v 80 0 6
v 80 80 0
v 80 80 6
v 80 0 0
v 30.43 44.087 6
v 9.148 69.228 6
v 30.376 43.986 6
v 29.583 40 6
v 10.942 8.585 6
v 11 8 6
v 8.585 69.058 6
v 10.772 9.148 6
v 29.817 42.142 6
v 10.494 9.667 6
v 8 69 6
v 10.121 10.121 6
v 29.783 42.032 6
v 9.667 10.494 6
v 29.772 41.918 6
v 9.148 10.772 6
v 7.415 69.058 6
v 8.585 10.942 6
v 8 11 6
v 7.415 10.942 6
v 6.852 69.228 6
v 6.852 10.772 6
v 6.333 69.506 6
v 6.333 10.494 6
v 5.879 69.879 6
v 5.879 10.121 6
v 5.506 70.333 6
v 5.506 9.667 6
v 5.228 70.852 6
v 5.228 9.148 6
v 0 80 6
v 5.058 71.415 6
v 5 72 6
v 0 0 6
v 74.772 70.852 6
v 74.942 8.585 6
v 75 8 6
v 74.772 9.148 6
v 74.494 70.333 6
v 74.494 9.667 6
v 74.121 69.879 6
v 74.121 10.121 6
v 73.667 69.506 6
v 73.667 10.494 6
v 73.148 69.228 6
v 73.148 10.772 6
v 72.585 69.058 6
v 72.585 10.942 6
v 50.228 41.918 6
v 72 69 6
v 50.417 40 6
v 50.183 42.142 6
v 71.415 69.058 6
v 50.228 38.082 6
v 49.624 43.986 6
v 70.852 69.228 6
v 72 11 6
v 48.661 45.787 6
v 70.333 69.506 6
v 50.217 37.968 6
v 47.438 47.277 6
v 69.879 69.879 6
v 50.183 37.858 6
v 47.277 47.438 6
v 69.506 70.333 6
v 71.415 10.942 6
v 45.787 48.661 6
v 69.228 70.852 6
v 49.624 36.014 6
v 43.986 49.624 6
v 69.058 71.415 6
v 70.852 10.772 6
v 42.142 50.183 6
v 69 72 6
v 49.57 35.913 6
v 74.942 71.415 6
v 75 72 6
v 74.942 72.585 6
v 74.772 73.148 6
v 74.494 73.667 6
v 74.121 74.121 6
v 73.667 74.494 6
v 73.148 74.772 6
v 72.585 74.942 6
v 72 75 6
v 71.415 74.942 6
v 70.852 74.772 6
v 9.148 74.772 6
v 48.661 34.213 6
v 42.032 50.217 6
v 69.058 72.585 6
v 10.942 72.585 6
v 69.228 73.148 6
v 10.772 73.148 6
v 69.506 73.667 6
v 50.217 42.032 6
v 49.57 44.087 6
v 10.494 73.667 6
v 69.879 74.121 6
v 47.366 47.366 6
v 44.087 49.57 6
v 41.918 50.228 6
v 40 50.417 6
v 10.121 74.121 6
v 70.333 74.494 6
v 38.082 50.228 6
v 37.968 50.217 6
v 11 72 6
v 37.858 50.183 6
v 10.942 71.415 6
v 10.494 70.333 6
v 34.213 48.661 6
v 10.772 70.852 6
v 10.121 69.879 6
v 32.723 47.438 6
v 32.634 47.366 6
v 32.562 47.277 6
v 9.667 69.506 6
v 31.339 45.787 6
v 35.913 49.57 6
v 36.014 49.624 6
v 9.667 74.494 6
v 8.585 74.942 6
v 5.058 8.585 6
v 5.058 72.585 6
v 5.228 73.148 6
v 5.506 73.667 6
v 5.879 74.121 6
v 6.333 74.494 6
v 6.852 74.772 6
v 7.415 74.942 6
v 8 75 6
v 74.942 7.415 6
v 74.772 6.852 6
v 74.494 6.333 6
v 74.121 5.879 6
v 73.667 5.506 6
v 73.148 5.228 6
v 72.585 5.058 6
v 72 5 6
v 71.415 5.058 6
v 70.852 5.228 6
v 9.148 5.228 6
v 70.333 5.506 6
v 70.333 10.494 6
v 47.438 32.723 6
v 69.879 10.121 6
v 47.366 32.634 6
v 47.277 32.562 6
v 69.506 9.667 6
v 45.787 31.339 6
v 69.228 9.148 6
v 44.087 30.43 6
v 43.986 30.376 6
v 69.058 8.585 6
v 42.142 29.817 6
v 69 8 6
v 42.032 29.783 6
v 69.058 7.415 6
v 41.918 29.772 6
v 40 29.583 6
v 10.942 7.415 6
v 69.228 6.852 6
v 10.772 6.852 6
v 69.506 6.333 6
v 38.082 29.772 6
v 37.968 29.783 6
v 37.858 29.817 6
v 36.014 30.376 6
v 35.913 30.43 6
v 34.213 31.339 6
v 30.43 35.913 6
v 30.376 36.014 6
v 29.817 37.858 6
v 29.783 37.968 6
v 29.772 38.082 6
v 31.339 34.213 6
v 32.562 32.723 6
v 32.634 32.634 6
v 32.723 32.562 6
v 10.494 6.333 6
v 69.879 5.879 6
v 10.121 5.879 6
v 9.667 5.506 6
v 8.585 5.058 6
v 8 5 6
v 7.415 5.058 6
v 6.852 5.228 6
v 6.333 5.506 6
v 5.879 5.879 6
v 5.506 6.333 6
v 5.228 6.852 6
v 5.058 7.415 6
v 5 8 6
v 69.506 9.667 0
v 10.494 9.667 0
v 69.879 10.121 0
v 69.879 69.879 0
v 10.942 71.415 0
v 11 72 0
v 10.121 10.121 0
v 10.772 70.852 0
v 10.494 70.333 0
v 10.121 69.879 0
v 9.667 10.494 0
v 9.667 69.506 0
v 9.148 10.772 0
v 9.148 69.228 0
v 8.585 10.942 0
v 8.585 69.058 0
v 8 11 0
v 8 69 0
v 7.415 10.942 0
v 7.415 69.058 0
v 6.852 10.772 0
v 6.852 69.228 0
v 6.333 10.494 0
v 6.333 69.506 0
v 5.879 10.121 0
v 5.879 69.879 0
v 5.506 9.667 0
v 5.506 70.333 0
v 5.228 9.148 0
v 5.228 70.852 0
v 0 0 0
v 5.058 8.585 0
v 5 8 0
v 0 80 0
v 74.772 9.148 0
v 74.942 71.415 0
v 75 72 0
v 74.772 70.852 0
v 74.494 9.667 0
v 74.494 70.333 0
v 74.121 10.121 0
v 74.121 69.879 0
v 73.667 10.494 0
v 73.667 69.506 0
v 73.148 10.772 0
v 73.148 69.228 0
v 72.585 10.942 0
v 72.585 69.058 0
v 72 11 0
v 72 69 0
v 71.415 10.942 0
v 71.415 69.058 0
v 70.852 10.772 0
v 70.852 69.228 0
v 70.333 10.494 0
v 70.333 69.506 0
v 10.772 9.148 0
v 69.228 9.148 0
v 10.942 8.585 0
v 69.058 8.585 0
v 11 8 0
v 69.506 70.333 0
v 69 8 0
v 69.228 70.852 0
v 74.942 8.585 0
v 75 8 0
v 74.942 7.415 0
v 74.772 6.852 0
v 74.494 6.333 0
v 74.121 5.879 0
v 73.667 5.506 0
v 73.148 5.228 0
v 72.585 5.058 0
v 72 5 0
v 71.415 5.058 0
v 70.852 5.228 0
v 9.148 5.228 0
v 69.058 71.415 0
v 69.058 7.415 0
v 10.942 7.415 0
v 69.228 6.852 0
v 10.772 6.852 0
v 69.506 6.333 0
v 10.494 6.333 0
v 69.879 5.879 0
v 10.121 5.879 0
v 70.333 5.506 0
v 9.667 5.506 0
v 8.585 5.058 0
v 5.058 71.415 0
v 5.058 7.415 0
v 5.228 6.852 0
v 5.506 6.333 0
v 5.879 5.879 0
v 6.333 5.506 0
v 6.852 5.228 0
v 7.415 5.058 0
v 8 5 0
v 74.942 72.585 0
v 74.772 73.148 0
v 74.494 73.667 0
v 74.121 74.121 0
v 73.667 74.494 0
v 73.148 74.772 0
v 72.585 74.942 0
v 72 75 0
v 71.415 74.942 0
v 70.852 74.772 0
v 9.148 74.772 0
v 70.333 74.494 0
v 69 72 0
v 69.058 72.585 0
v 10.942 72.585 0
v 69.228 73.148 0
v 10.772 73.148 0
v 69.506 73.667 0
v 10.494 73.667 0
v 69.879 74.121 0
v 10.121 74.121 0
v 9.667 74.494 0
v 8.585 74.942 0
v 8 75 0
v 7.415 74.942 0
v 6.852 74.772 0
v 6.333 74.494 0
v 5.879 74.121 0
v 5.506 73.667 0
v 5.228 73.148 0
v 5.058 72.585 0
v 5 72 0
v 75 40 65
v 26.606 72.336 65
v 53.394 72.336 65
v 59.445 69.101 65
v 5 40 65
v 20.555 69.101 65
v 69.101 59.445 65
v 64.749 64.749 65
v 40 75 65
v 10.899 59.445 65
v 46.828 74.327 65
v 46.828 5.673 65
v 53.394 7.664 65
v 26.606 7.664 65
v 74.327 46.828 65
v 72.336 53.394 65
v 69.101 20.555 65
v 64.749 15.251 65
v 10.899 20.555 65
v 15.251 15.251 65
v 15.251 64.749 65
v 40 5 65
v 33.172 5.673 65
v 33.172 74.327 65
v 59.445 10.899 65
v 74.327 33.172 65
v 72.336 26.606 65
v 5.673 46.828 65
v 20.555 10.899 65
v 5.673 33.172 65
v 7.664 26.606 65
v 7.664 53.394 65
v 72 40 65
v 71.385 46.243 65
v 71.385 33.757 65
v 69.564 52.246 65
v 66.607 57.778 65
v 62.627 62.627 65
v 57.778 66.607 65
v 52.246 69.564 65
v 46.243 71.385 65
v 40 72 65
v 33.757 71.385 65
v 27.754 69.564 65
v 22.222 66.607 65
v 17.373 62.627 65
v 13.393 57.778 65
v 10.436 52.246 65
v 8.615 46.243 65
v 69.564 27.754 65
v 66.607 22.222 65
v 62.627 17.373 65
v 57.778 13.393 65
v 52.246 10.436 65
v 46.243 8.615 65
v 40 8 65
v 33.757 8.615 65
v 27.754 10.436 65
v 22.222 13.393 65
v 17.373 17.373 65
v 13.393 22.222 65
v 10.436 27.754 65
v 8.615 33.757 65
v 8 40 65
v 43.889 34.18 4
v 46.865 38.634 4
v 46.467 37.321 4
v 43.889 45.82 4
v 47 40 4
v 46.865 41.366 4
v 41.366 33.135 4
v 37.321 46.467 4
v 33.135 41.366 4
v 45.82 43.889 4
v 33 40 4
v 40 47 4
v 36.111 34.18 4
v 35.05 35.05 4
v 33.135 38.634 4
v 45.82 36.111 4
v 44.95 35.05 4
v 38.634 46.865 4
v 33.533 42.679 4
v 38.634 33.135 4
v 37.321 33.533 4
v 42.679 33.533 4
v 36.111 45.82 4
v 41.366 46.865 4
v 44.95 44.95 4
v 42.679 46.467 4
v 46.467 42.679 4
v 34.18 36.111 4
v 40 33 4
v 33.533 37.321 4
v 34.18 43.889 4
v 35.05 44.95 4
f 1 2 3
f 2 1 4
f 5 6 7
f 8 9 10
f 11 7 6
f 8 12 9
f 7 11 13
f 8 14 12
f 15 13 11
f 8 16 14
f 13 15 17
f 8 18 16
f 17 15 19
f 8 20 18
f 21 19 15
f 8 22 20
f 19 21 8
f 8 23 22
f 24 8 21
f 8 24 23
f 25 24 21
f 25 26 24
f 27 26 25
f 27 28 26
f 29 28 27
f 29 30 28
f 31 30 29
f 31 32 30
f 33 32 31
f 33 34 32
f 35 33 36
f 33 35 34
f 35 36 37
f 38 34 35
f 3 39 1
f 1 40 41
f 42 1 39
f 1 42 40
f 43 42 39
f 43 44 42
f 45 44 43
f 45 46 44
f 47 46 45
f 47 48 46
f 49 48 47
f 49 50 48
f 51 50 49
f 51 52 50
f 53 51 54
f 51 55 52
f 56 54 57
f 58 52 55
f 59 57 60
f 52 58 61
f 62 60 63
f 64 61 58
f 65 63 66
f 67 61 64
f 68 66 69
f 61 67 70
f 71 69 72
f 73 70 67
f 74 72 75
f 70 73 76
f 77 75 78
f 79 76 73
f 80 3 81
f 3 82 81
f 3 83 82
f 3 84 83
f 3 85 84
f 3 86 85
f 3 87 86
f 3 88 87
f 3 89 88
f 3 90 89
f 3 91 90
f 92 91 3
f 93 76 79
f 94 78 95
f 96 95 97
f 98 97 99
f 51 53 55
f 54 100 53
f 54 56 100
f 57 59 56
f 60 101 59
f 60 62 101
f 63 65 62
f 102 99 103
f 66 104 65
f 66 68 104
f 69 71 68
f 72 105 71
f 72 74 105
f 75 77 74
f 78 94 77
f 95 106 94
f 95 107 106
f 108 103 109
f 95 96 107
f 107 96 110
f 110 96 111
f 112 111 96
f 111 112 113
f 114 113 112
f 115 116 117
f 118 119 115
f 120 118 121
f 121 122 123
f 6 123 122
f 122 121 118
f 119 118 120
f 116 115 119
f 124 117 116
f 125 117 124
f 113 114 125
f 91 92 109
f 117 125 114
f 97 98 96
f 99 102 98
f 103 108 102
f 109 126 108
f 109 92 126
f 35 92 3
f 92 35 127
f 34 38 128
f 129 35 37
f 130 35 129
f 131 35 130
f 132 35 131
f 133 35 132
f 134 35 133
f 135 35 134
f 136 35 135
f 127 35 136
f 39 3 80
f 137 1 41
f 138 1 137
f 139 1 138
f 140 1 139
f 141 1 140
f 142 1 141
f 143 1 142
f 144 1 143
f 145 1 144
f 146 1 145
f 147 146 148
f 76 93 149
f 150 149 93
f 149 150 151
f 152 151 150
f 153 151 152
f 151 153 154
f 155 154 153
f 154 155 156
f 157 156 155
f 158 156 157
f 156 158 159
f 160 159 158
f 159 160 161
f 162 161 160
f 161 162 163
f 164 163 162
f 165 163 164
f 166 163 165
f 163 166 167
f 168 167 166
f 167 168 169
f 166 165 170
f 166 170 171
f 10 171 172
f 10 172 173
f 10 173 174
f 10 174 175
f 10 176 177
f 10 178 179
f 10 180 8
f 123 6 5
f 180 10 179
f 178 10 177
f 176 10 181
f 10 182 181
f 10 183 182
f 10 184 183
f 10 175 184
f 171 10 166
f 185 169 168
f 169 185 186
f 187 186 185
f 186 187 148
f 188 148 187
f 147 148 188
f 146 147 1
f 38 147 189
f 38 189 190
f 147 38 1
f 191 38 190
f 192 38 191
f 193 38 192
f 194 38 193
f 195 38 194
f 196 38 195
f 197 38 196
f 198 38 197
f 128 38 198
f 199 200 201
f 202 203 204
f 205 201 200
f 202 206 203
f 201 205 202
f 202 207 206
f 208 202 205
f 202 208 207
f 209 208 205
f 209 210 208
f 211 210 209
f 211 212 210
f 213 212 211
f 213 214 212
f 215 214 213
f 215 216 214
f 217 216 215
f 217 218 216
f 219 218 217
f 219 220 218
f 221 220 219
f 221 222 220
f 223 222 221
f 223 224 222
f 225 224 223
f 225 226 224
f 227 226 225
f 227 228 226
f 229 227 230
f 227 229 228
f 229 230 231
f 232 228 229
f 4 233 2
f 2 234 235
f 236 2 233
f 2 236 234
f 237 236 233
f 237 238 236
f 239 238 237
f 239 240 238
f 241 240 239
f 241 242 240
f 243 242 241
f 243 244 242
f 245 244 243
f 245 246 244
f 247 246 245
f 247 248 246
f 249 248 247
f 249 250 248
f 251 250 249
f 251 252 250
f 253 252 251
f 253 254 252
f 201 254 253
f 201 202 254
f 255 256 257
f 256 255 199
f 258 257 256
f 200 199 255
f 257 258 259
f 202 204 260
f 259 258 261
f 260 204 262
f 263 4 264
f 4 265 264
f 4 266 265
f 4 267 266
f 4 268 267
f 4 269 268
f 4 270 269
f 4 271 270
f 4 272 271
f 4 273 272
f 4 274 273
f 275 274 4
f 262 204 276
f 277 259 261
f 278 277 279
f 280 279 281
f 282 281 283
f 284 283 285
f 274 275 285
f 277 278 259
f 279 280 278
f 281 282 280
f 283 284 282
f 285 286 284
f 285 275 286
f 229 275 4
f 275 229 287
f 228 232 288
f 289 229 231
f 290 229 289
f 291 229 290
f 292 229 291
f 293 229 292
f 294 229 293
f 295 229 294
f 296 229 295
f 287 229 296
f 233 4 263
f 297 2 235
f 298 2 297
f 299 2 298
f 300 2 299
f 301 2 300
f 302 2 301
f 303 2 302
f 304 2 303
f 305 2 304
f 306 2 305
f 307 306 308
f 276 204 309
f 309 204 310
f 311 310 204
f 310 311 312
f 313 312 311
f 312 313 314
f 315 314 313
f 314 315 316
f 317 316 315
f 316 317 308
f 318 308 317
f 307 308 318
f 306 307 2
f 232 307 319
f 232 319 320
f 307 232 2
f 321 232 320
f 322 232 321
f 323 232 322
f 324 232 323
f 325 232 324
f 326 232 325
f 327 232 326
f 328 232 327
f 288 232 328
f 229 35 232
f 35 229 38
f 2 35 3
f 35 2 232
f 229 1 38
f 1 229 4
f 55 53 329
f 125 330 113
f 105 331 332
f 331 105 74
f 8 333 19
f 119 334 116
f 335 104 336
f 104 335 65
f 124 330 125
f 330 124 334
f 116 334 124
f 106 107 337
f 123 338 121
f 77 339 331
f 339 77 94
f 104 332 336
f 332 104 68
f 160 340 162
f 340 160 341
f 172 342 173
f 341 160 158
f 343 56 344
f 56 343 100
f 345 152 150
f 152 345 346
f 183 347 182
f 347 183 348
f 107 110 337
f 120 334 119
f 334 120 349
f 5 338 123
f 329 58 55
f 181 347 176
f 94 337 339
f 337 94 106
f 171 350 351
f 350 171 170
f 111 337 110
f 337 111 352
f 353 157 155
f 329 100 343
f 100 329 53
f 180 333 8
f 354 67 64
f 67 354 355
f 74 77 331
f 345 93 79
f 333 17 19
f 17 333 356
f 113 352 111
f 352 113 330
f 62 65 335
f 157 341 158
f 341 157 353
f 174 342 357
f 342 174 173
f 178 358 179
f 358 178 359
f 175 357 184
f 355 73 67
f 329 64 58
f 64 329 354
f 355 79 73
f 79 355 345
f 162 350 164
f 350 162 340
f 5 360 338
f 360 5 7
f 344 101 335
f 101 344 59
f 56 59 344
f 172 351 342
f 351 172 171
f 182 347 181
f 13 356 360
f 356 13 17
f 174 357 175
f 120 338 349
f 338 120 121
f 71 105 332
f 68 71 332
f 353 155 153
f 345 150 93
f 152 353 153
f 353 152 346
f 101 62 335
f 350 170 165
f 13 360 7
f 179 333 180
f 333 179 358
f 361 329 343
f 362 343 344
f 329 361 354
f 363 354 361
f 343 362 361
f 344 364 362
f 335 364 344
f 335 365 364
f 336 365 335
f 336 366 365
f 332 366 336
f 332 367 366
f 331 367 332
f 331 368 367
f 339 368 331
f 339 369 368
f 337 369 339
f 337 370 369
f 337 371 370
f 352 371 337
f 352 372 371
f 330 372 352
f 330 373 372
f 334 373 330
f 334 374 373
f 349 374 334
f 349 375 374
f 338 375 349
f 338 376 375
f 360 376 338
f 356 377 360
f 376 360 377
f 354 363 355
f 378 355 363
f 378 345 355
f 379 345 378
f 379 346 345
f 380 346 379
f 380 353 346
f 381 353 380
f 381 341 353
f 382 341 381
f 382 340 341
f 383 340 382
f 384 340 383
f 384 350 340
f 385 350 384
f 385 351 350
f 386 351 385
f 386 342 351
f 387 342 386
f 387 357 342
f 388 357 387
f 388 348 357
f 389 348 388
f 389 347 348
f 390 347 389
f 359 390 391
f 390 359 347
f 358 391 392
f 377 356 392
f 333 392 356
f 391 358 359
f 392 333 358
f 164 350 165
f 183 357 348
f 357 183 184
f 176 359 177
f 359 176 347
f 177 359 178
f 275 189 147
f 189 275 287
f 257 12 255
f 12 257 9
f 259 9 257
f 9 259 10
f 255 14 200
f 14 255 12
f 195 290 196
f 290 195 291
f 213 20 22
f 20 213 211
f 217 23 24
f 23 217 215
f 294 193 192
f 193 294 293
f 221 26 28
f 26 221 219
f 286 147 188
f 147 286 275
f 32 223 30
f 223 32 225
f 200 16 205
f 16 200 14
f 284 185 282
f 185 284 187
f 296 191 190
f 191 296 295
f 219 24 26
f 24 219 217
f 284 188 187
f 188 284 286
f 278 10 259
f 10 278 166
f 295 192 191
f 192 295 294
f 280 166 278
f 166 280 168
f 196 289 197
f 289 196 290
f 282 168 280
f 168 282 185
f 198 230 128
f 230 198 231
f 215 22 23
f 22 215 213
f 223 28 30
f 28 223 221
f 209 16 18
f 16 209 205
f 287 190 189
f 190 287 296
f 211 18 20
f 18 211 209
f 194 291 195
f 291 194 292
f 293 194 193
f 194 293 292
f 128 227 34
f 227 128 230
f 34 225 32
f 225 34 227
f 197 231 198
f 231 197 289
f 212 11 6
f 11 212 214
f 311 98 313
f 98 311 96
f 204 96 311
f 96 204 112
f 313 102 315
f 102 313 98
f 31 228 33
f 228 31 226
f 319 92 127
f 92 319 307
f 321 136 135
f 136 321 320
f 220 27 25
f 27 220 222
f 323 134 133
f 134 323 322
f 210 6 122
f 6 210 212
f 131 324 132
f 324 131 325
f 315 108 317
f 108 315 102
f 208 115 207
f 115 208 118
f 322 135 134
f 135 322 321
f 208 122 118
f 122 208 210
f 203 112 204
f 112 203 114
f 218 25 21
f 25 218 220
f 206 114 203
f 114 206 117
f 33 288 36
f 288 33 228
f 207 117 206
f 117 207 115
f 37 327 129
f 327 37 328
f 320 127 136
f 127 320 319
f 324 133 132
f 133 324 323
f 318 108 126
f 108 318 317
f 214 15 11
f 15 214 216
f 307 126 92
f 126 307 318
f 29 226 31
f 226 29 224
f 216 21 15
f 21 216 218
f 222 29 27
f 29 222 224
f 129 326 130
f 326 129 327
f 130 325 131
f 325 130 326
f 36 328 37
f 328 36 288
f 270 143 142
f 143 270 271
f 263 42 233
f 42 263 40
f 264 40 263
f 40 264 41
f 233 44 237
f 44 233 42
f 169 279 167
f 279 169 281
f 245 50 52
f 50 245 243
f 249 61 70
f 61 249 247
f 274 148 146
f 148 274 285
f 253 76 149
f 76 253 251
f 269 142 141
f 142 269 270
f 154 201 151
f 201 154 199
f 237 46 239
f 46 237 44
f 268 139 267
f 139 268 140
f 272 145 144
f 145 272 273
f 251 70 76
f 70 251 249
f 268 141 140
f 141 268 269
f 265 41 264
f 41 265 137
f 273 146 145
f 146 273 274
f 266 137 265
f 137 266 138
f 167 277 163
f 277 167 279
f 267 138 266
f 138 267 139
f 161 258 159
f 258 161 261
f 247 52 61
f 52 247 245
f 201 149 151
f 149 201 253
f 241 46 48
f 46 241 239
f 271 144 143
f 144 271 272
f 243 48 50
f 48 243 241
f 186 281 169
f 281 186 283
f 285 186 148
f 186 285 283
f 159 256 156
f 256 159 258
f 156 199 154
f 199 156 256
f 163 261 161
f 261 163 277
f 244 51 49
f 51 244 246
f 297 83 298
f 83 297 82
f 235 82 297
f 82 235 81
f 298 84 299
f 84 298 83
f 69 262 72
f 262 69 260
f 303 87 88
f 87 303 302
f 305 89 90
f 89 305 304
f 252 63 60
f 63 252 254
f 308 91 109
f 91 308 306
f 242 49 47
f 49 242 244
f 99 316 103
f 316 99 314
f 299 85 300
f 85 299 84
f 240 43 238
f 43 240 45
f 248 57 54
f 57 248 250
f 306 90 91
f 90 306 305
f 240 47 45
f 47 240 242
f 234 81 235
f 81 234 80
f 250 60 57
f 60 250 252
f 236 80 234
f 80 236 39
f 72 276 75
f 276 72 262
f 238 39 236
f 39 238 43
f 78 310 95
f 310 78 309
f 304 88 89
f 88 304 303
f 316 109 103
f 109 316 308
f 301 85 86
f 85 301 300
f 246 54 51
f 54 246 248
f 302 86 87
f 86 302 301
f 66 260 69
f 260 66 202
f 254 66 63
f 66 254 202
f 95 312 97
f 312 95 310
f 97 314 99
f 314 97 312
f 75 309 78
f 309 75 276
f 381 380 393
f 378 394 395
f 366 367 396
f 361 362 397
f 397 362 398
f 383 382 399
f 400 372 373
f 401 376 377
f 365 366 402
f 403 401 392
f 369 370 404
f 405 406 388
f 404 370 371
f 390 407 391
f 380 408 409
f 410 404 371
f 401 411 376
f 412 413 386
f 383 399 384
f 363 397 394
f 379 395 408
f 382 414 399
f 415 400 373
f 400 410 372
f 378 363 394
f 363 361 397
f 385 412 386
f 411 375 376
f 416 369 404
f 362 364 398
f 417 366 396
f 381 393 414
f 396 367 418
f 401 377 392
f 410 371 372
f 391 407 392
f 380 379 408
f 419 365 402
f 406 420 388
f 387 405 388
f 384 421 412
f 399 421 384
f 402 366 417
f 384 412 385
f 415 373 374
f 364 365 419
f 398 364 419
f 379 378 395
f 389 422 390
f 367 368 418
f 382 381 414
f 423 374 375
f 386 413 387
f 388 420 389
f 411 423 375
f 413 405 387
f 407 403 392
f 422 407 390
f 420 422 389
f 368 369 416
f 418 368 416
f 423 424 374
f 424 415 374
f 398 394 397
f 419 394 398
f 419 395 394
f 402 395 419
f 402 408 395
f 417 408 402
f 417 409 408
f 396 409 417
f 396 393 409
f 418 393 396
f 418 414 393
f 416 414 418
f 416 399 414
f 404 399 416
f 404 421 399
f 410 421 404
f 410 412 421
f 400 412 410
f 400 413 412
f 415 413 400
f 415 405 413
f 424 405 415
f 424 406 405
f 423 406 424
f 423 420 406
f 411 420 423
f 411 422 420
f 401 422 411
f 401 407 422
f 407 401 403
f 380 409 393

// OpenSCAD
$fn = 32;

// ----------------------------------------------------------------------
// Hopper: flanged with square flange
// ----------------------------------------------------------------------

// --- parameters (mm) ---
fl = 80;                  // flange side, X and Y
fl_t = 6;                 // flange thickness
cone_h = 60;              // cone height above the flange
top_d = 70;               // cone mouth diameter
bot_d = 20;               // cone spout diameter
wall = 3;                 // cone wall thickness
hole_r = 3;               // flange hole radius
hole_in = 8;              // hole inset from the corners

bore_d = bot_d - 2 * wall;  // spout bore diameter
total_h = fl_t + cone_h - 1;  // overall height

difference() {
  union() {
    cube([fl, fl, fl_t]);
    translate([fl / 2, fl / 2, fl_t - 1])
      cylinder(h = cone_h, d1 = bot_d, d2 = top_d);
  }
  translate([fl / 2, fl / 2, fl_t - 2])
    cylinder(h = cone_h + 1, d1 = bore_d, d2 = top_d - 2 * wall);
  for (sx = [0, 1], sy = [0, 1])
    translate([sx ? fl - hole_in : hole_in,
               sy ? fl - hole_in : hole_in, -1])
      cylinder(r = hole_r, h = fl_t + 2);
}
